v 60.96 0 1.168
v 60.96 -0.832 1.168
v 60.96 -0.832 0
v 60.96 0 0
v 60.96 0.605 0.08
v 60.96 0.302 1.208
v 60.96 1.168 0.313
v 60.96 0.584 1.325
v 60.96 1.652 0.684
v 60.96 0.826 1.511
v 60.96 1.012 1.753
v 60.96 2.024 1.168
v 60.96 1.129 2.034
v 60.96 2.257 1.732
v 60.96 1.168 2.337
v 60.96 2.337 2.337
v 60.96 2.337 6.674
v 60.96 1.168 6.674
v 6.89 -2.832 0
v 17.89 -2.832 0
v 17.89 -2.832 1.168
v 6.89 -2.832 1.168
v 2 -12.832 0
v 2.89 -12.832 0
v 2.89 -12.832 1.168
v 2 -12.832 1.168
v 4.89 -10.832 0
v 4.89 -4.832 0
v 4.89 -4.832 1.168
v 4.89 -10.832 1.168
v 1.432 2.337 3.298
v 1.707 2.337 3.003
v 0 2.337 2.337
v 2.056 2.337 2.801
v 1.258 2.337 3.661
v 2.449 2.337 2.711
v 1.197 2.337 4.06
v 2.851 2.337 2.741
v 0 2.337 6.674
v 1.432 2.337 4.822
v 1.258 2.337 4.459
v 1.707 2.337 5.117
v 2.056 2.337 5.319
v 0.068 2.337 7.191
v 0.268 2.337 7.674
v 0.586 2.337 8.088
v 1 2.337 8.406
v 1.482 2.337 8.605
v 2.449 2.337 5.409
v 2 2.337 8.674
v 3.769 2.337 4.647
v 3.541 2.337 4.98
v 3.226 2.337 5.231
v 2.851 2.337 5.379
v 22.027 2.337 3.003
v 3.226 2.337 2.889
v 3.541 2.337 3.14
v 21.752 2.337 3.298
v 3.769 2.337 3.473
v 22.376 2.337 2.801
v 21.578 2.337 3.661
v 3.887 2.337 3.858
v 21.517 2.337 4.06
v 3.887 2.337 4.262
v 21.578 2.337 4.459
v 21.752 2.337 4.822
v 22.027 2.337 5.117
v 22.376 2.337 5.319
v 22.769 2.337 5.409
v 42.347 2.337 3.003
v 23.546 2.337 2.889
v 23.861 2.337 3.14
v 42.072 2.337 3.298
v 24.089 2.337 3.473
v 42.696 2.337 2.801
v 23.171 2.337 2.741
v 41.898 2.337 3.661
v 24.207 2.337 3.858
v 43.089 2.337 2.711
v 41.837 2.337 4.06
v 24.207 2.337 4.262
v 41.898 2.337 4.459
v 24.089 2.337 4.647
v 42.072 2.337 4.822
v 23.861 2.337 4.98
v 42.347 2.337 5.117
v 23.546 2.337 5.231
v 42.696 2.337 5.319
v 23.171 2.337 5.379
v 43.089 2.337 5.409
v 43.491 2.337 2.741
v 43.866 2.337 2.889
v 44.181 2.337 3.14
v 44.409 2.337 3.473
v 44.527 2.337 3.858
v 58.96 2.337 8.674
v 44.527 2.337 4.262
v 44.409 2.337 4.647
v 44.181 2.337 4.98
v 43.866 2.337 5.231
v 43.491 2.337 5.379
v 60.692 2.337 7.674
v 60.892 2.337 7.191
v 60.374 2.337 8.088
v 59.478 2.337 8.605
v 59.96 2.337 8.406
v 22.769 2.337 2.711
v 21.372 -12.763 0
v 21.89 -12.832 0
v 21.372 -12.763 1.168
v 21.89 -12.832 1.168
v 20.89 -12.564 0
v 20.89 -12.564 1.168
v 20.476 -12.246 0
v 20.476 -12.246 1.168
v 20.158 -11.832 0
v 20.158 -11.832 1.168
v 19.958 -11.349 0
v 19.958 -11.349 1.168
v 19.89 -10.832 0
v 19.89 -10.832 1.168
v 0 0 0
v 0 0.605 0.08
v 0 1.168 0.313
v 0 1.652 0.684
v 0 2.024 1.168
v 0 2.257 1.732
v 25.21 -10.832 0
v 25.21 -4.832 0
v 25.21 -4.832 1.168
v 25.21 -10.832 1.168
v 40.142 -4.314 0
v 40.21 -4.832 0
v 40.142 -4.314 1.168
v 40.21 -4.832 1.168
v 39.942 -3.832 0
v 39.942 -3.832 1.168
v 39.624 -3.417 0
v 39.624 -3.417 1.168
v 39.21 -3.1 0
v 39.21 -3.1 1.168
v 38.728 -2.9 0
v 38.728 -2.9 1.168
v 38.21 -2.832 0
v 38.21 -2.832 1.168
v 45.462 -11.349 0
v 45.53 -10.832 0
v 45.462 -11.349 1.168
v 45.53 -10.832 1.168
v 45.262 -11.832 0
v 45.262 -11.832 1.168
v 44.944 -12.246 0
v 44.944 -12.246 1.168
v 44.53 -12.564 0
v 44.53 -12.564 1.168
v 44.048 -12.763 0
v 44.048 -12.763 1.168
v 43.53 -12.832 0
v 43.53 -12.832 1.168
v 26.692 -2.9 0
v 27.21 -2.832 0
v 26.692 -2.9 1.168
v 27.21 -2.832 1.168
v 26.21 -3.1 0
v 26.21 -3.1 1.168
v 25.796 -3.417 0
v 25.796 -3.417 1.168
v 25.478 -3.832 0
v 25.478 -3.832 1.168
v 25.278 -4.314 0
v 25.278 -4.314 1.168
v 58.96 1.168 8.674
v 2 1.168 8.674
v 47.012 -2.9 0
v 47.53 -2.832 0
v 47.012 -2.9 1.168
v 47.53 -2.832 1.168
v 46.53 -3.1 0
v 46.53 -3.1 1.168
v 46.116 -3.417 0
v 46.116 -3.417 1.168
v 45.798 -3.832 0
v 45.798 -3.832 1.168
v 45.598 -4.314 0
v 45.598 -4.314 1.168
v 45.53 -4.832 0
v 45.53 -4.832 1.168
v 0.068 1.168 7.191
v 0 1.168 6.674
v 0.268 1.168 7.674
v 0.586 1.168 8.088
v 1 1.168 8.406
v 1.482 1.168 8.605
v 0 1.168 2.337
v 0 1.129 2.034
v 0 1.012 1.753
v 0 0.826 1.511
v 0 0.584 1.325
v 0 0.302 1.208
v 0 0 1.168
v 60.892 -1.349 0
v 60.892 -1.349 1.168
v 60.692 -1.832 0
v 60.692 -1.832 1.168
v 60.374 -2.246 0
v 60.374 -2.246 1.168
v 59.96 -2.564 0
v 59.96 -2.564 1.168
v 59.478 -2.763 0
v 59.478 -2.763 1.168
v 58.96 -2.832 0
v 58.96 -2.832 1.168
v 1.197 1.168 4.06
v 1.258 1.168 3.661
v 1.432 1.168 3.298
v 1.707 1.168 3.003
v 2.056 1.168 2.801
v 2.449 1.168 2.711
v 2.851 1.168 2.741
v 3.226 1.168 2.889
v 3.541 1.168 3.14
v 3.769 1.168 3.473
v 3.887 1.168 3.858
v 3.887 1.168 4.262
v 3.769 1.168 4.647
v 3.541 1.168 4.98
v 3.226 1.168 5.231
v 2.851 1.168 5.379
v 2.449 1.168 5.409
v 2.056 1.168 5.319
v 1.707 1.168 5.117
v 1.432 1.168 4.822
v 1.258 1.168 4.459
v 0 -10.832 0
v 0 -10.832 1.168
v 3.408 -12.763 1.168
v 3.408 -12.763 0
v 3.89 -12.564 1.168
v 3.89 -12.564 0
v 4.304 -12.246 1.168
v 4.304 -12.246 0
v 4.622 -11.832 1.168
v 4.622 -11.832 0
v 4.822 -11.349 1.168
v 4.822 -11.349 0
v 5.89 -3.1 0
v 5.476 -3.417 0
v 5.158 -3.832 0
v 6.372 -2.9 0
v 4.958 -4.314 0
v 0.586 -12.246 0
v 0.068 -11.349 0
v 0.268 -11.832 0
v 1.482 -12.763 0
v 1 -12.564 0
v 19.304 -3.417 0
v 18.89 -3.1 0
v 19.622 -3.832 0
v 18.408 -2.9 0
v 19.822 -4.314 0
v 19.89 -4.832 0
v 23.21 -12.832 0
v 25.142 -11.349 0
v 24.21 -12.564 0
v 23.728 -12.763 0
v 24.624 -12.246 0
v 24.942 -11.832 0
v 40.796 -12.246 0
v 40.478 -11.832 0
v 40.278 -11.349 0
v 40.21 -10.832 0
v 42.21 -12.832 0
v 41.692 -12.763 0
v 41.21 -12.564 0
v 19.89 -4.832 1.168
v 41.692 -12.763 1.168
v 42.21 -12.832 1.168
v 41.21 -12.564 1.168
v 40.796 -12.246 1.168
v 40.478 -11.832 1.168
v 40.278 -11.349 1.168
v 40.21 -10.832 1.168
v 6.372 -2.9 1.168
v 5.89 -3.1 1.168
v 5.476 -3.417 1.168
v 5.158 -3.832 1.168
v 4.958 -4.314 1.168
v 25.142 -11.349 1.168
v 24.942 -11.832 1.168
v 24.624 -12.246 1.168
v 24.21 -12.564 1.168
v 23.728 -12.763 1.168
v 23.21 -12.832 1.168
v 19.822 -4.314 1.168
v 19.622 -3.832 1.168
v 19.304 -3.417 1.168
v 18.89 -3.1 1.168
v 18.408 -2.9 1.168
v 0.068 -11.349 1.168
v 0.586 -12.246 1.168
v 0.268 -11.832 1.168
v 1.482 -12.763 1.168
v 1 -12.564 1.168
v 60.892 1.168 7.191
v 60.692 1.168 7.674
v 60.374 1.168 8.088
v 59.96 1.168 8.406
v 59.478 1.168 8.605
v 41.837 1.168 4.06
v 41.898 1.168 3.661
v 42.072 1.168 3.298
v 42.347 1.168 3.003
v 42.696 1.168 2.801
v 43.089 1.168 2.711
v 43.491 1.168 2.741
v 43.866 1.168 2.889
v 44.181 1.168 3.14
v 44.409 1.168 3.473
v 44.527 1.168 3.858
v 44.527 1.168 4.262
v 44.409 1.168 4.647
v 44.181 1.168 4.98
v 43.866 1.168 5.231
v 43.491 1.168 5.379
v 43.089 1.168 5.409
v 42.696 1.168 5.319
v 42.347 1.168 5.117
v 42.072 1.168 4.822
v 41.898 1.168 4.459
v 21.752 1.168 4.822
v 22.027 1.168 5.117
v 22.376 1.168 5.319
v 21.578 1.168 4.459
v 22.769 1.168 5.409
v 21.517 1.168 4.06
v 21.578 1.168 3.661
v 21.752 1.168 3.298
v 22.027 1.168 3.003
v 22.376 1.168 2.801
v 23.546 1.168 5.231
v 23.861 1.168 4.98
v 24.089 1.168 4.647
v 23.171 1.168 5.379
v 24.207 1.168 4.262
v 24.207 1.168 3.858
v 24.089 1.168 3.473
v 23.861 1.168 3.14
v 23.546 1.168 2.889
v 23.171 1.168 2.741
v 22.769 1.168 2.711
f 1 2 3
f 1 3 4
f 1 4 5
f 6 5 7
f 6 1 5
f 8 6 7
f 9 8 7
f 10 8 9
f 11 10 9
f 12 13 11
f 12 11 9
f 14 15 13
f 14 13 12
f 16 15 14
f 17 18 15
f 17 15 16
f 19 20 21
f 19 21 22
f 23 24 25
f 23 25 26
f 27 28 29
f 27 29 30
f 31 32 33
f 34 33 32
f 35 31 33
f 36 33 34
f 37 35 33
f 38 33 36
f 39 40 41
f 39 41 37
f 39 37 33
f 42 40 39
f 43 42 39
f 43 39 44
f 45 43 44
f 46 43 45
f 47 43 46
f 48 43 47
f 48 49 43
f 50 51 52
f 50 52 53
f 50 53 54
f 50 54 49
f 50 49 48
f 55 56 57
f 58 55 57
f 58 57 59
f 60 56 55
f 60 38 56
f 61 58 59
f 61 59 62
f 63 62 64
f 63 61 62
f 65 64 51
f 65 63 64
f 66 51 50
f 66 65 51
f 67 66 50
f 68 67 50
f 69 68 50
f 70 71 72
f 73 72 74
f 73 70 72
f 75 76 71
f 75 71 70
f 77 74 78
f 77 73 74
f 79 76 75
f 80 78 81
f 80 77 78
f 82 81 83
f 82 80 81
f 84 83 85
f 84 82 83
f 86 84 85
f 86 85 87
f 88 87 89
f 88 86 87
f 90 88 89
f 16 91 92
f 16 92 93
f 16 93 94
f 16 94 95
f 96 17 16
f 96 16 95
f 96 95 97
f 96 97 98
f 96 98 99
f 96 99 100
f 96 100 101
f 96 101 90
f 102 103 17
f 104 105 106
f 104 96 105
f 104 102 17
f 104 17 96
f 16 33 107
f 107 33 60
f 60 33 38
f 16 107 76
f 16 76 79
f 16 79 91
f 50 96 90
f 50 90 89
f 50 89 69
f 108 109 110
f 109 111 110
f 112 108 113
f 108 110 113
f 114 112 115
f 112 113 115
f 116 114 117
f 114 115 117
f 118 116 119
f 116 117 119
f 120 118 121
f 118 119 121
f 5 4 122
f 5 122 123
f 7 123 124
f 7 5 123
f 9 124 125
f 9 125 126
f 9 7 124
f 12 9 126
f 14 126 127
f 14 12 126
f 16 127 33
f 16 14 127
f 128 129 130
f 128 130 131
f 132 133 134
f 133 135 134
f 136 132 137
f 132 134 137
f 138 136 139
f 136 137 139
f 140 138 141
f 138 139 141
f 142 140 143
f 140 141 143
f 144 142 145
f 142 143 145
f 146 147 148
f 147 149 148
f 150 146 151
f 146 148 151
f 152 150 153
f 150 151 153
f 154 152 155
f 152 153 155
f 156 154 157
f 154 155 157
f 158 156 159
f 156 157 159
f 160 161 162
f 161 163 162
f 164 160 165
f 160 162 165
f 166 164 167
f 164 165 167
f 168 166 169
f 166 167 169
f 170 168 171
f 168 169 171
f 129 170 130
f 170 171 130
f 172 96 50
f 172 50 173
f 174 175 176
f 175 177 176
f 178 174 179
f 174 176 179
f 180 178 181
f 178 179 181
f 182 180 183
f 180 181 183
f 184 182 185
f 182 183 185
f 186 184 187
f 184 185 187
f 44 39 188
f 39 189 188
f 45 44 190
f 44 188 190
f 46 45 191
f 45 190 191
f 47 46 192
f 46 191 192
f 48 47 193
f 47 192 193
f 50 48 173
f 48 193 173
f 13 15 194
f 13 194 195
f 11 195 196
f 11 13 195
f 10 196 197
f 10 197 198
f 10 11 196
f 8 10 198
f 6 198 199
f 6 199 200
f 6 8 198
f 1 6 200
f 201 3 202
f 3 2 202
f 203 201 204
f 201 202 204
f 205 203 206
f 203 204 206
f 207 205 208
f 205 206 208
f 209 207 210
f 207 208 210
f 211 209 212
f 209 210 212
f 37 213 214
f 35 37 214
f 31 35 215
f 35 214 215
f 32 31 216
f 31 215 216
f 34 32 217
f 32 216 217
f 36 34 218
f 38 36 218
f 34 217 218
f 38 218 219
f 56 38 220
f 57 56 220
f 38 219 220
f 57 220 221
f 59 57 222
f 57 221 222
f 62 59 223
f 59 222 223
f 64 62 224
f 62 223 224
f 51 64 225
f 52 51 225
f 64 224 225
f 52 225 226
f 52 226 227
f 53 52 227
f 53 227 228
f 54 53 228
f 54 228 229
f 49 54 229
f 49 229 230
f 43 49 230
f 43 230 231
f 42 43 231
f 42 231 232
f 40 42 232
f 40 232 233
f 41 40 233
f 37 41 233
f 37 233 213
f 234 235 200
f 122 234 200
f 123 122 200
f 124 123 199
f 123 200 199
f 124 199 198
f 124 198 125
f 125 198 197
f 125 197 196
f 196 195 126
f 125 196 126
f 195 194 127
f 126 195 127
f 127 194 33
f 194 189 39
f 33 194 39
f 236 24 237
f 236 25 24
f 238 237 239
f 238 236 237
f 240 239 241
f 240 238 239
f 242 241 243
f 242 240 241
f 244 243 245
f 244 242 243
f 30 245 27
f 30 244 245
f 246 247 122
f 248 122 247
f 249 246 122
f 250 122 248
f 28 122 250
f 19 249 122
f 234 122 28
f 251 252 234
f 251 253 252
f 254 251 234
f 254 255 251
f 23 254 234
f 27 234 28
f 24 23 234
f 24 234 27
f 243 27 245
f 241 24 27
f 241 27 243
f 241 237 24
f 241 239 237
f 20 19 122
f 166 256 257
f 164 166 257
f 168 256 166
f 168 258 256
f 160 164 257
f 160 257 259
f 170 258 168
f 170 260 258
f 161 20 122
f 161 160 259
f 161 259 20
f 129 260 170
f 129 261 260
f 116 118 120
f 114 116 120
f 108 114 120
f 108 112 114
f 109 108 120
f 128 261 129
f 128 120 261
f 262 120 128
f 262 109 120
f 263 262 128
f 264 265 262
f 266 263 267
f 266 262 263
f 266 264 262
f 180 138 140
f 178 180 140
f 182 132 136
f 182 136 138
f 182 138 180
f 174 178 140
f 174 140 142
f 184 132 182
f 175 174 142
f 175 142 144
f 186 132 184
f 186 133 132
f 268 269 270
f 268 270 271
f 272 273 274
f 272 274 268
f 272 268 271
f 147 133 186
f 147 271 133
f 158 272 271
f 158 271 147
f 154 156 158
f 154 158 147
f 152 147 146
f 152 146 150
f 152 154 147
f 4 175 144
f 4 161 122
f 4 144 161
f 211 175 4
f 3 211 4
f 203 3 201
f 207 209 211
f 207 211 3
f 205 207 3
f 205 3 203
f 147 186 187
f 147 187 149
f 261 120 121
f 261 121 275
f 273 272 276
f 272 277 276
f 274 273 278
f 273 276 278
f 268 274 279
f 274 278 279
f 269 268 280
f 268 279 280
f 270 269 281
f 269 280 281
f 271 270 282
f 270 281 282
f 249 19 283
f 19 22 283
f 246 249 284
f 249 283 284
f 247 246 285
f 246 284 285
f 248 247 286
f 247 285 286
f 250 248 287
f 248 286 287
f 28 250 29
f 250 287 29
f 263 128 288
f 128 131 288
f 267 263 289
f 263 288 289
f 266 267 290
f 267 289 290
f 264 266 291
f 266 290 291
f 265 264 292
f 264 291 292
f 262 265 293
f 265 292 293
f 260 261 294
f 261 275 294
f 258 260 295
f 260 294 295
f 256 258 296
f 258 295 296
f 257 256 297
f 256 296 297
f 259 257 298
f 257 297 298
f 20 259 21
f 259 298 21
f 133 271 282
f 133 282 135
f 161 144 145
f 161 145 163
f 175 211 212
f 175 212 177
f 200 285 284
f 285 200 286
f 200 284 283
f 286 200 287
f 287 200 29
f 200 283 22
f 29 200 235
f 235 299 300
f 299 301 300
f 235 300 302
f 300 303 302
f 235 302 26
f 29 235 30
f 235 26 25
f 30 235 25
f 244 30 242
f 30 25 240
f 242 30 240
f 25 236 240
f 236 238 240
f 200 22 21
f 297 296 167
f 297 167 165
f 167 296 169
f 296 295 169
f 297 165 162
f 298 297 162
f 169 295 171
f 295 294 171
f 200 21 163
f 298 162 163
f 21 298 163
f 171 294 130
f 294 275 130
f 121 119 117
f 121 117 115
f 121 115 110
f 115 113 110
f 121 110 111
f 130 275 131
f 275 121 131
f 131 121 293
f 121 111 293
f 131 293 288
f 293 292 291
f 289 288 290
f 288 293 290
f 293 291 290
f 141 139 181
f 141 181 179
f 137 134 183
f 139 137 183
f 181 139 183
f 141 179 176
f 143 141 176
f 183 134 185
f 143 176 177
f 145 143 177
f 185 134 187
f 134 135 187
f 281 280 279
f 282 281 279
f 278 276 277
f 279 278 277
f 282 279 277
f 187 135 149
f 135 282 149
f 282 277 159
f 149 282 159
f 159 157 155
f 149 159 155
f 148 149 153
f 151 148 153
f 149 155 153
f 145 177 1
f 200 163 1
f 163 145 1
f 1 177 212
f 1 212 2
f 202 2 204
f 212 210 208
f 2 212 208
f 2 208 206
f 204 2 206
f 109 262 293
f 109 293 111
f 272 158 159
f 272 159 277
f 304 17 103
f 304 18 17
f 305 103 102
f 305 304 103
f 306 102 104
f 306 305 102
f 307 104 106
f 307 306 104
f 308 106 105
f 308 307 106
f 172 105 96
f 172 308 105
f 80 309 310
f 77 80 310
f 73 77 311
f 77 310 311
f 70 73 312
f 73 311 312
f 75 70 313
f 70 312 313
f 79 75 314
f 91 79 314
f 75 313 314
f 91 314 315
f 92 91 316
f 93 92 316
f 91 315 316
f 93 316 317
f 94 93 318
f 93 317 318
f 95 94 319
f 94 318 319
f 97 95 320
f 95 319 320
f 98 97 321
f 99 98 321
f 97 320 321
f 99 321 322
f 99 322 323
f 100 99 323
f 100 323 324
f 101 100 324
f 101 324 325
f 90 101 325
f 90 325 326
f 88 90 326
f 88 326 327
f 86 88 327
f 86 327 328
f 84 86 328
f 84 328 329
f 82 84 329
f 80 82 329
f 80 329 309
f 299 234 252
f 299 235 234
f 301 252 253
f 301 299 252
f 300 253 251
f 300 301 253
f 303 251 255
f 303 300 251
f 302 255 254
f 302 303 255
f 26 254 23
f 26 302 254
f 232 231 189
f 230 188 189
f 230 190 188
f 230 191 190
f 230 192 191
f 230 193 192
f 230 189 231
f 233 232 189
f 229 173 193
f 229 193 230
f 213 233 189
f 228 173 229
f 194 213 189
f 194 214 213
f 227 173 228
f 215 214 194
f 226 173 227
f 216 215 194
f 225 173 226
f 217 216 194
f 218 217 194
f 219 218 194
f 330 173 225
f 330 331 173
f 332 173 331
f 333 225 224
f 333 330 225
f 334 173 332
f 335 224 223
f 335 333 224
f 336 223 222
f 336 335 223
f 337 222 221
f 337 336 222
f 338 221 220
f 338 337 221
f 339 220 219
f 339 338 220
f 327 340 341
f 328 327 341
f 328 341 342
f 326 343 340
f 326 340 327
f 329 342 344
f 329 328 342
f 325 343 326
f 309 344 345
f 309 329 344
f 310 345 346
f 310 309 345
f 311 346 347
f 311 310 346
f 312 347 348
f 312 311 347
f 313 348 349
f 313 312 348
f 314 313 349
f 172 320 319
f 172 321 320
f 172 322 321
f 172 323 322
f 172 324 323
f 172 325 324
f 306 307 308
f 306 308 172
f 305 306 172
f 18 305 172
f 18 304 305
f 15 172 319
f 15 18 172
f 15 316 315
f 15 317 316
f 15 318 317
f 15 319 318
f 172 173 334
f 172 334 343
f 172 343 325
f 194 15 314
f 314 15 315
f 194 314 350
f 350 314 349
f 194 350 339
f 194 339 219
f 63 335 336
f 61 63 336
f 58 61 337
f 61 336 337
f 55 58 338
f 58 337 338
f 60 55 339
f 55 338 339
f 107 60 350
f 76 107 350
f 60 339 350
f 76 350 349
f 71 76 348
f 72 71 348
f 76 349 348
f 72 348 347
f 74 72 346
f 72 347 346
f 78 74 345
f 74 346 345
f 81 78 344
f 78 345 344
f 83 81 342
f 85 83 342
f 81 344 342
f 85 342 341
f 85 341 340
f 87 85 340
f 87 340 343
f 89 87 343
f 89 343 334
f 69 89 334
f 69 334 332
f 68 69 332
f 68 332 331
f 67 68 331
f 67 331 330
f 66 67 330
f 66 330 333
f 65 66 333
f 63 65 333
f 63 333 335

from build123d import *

# Parameters (mm, degrees)
BASE_FLANGE1_DEPTH        = 1.1684
EDGE_FLANGE1_DEPTH        = 60.96
TAP_DRILL_FOR_6_32_TAP1_D = 2.7051
FILLET1_R                 = 2


# Sheet-metal steps are written as plain solids
with BuildPart() as part:
    # Sketch1 → Base-Flange1 (new body)
    with BuildSketch(Plane(origin=(0, 0, 0), x_dir=(1, 0, 0), z_dir=(0, 0, -1))):
        Polygon((0, 0), (60.96, 0), (60.96, 2.8316), (45.53, 2.8316), (45.53, 12.8316), (40.21, 12.8316), (40.21, 2.8316), (25.21, 2.8316), (25.21, 12.8316), (19.89, 12.8316), (19.89, 2.8316), (4.89, 2.8316), (4.89, 12.8316), (0, 12.8316), (0, 2.8316), align=None)
    extrude(amount=-BASE_FLANGE1_DEPTH)

    # Edge-Flange1 section (across the edge) → Edge-Flange1 (add)
    with BuildSketch(Plane(origin=(60.96, 1.1684, 1.1684), x_dir=(0, -1, 0), z_dir=(-1, 0, 0))):
        with BuildLine():
            Line((-1.1684, 1.1684), (-1.1684, 7.5052))
            Line((-1.1684, 7.5052), (0, 7.5052))
            Line((0, 7.5052), (0, 1.1684))
            ThreePointArc((0, 1.1684), (0.342216437, 0.342216437), (1.1684, 0))
            Line((1.1684, 0), (1.1684, -1.1684))
            ThreePointArc((1.1684, -1.1684), (-0.483967126, -0.483967126), (-1.1684, 1.1684))
        make_face()
    extrude(amount=EDGE_FLANGE1_DEPTH)

    # Tap Drill for #6-32 Tap1 (through all)
    with Locations(Plane(origin=(0, 2.3368, 0), x_dir=(1, 0, 0), z_dir=(0, 1, 0))):
        with Locations((2.55, -4.06), (22.87, -4.06), (43.19, -4.06)):
            Hole(TAP_DRILL_FOR_6_32_TAP1_D / 2)

    # Fillet1
    fillet1_edges = [part.edges().sort_by_distance(p)[0] for p in [
        (0, -12.8316, 0.5842),
        (4.89, -12.8316, 0.5842),
        (4.89, -2.8316, 0.5842),
        (19.89, -2.8316, 0.5842),
        (19.89, -12.8316, 0.5842),
        (25.21, -12.8316, 0.5842),
        (25.21, -2.8316, 0.5842),
        (40.21, -2.8316, 0.5842),
        (40.21, -12.8316, 0.5842),
        (45.53, -12.8316, 0.5842),
        (45.53, -2.8316, 0.5842),
        (60.96, -2.8316, 0.5842),
        (60.96, 1.7526, 8.6736),
        (0, 1.7526, 8.6736),
    ]]
    fillet(fillet1_edges, radius=FILLET1_R)


solid = part.part
